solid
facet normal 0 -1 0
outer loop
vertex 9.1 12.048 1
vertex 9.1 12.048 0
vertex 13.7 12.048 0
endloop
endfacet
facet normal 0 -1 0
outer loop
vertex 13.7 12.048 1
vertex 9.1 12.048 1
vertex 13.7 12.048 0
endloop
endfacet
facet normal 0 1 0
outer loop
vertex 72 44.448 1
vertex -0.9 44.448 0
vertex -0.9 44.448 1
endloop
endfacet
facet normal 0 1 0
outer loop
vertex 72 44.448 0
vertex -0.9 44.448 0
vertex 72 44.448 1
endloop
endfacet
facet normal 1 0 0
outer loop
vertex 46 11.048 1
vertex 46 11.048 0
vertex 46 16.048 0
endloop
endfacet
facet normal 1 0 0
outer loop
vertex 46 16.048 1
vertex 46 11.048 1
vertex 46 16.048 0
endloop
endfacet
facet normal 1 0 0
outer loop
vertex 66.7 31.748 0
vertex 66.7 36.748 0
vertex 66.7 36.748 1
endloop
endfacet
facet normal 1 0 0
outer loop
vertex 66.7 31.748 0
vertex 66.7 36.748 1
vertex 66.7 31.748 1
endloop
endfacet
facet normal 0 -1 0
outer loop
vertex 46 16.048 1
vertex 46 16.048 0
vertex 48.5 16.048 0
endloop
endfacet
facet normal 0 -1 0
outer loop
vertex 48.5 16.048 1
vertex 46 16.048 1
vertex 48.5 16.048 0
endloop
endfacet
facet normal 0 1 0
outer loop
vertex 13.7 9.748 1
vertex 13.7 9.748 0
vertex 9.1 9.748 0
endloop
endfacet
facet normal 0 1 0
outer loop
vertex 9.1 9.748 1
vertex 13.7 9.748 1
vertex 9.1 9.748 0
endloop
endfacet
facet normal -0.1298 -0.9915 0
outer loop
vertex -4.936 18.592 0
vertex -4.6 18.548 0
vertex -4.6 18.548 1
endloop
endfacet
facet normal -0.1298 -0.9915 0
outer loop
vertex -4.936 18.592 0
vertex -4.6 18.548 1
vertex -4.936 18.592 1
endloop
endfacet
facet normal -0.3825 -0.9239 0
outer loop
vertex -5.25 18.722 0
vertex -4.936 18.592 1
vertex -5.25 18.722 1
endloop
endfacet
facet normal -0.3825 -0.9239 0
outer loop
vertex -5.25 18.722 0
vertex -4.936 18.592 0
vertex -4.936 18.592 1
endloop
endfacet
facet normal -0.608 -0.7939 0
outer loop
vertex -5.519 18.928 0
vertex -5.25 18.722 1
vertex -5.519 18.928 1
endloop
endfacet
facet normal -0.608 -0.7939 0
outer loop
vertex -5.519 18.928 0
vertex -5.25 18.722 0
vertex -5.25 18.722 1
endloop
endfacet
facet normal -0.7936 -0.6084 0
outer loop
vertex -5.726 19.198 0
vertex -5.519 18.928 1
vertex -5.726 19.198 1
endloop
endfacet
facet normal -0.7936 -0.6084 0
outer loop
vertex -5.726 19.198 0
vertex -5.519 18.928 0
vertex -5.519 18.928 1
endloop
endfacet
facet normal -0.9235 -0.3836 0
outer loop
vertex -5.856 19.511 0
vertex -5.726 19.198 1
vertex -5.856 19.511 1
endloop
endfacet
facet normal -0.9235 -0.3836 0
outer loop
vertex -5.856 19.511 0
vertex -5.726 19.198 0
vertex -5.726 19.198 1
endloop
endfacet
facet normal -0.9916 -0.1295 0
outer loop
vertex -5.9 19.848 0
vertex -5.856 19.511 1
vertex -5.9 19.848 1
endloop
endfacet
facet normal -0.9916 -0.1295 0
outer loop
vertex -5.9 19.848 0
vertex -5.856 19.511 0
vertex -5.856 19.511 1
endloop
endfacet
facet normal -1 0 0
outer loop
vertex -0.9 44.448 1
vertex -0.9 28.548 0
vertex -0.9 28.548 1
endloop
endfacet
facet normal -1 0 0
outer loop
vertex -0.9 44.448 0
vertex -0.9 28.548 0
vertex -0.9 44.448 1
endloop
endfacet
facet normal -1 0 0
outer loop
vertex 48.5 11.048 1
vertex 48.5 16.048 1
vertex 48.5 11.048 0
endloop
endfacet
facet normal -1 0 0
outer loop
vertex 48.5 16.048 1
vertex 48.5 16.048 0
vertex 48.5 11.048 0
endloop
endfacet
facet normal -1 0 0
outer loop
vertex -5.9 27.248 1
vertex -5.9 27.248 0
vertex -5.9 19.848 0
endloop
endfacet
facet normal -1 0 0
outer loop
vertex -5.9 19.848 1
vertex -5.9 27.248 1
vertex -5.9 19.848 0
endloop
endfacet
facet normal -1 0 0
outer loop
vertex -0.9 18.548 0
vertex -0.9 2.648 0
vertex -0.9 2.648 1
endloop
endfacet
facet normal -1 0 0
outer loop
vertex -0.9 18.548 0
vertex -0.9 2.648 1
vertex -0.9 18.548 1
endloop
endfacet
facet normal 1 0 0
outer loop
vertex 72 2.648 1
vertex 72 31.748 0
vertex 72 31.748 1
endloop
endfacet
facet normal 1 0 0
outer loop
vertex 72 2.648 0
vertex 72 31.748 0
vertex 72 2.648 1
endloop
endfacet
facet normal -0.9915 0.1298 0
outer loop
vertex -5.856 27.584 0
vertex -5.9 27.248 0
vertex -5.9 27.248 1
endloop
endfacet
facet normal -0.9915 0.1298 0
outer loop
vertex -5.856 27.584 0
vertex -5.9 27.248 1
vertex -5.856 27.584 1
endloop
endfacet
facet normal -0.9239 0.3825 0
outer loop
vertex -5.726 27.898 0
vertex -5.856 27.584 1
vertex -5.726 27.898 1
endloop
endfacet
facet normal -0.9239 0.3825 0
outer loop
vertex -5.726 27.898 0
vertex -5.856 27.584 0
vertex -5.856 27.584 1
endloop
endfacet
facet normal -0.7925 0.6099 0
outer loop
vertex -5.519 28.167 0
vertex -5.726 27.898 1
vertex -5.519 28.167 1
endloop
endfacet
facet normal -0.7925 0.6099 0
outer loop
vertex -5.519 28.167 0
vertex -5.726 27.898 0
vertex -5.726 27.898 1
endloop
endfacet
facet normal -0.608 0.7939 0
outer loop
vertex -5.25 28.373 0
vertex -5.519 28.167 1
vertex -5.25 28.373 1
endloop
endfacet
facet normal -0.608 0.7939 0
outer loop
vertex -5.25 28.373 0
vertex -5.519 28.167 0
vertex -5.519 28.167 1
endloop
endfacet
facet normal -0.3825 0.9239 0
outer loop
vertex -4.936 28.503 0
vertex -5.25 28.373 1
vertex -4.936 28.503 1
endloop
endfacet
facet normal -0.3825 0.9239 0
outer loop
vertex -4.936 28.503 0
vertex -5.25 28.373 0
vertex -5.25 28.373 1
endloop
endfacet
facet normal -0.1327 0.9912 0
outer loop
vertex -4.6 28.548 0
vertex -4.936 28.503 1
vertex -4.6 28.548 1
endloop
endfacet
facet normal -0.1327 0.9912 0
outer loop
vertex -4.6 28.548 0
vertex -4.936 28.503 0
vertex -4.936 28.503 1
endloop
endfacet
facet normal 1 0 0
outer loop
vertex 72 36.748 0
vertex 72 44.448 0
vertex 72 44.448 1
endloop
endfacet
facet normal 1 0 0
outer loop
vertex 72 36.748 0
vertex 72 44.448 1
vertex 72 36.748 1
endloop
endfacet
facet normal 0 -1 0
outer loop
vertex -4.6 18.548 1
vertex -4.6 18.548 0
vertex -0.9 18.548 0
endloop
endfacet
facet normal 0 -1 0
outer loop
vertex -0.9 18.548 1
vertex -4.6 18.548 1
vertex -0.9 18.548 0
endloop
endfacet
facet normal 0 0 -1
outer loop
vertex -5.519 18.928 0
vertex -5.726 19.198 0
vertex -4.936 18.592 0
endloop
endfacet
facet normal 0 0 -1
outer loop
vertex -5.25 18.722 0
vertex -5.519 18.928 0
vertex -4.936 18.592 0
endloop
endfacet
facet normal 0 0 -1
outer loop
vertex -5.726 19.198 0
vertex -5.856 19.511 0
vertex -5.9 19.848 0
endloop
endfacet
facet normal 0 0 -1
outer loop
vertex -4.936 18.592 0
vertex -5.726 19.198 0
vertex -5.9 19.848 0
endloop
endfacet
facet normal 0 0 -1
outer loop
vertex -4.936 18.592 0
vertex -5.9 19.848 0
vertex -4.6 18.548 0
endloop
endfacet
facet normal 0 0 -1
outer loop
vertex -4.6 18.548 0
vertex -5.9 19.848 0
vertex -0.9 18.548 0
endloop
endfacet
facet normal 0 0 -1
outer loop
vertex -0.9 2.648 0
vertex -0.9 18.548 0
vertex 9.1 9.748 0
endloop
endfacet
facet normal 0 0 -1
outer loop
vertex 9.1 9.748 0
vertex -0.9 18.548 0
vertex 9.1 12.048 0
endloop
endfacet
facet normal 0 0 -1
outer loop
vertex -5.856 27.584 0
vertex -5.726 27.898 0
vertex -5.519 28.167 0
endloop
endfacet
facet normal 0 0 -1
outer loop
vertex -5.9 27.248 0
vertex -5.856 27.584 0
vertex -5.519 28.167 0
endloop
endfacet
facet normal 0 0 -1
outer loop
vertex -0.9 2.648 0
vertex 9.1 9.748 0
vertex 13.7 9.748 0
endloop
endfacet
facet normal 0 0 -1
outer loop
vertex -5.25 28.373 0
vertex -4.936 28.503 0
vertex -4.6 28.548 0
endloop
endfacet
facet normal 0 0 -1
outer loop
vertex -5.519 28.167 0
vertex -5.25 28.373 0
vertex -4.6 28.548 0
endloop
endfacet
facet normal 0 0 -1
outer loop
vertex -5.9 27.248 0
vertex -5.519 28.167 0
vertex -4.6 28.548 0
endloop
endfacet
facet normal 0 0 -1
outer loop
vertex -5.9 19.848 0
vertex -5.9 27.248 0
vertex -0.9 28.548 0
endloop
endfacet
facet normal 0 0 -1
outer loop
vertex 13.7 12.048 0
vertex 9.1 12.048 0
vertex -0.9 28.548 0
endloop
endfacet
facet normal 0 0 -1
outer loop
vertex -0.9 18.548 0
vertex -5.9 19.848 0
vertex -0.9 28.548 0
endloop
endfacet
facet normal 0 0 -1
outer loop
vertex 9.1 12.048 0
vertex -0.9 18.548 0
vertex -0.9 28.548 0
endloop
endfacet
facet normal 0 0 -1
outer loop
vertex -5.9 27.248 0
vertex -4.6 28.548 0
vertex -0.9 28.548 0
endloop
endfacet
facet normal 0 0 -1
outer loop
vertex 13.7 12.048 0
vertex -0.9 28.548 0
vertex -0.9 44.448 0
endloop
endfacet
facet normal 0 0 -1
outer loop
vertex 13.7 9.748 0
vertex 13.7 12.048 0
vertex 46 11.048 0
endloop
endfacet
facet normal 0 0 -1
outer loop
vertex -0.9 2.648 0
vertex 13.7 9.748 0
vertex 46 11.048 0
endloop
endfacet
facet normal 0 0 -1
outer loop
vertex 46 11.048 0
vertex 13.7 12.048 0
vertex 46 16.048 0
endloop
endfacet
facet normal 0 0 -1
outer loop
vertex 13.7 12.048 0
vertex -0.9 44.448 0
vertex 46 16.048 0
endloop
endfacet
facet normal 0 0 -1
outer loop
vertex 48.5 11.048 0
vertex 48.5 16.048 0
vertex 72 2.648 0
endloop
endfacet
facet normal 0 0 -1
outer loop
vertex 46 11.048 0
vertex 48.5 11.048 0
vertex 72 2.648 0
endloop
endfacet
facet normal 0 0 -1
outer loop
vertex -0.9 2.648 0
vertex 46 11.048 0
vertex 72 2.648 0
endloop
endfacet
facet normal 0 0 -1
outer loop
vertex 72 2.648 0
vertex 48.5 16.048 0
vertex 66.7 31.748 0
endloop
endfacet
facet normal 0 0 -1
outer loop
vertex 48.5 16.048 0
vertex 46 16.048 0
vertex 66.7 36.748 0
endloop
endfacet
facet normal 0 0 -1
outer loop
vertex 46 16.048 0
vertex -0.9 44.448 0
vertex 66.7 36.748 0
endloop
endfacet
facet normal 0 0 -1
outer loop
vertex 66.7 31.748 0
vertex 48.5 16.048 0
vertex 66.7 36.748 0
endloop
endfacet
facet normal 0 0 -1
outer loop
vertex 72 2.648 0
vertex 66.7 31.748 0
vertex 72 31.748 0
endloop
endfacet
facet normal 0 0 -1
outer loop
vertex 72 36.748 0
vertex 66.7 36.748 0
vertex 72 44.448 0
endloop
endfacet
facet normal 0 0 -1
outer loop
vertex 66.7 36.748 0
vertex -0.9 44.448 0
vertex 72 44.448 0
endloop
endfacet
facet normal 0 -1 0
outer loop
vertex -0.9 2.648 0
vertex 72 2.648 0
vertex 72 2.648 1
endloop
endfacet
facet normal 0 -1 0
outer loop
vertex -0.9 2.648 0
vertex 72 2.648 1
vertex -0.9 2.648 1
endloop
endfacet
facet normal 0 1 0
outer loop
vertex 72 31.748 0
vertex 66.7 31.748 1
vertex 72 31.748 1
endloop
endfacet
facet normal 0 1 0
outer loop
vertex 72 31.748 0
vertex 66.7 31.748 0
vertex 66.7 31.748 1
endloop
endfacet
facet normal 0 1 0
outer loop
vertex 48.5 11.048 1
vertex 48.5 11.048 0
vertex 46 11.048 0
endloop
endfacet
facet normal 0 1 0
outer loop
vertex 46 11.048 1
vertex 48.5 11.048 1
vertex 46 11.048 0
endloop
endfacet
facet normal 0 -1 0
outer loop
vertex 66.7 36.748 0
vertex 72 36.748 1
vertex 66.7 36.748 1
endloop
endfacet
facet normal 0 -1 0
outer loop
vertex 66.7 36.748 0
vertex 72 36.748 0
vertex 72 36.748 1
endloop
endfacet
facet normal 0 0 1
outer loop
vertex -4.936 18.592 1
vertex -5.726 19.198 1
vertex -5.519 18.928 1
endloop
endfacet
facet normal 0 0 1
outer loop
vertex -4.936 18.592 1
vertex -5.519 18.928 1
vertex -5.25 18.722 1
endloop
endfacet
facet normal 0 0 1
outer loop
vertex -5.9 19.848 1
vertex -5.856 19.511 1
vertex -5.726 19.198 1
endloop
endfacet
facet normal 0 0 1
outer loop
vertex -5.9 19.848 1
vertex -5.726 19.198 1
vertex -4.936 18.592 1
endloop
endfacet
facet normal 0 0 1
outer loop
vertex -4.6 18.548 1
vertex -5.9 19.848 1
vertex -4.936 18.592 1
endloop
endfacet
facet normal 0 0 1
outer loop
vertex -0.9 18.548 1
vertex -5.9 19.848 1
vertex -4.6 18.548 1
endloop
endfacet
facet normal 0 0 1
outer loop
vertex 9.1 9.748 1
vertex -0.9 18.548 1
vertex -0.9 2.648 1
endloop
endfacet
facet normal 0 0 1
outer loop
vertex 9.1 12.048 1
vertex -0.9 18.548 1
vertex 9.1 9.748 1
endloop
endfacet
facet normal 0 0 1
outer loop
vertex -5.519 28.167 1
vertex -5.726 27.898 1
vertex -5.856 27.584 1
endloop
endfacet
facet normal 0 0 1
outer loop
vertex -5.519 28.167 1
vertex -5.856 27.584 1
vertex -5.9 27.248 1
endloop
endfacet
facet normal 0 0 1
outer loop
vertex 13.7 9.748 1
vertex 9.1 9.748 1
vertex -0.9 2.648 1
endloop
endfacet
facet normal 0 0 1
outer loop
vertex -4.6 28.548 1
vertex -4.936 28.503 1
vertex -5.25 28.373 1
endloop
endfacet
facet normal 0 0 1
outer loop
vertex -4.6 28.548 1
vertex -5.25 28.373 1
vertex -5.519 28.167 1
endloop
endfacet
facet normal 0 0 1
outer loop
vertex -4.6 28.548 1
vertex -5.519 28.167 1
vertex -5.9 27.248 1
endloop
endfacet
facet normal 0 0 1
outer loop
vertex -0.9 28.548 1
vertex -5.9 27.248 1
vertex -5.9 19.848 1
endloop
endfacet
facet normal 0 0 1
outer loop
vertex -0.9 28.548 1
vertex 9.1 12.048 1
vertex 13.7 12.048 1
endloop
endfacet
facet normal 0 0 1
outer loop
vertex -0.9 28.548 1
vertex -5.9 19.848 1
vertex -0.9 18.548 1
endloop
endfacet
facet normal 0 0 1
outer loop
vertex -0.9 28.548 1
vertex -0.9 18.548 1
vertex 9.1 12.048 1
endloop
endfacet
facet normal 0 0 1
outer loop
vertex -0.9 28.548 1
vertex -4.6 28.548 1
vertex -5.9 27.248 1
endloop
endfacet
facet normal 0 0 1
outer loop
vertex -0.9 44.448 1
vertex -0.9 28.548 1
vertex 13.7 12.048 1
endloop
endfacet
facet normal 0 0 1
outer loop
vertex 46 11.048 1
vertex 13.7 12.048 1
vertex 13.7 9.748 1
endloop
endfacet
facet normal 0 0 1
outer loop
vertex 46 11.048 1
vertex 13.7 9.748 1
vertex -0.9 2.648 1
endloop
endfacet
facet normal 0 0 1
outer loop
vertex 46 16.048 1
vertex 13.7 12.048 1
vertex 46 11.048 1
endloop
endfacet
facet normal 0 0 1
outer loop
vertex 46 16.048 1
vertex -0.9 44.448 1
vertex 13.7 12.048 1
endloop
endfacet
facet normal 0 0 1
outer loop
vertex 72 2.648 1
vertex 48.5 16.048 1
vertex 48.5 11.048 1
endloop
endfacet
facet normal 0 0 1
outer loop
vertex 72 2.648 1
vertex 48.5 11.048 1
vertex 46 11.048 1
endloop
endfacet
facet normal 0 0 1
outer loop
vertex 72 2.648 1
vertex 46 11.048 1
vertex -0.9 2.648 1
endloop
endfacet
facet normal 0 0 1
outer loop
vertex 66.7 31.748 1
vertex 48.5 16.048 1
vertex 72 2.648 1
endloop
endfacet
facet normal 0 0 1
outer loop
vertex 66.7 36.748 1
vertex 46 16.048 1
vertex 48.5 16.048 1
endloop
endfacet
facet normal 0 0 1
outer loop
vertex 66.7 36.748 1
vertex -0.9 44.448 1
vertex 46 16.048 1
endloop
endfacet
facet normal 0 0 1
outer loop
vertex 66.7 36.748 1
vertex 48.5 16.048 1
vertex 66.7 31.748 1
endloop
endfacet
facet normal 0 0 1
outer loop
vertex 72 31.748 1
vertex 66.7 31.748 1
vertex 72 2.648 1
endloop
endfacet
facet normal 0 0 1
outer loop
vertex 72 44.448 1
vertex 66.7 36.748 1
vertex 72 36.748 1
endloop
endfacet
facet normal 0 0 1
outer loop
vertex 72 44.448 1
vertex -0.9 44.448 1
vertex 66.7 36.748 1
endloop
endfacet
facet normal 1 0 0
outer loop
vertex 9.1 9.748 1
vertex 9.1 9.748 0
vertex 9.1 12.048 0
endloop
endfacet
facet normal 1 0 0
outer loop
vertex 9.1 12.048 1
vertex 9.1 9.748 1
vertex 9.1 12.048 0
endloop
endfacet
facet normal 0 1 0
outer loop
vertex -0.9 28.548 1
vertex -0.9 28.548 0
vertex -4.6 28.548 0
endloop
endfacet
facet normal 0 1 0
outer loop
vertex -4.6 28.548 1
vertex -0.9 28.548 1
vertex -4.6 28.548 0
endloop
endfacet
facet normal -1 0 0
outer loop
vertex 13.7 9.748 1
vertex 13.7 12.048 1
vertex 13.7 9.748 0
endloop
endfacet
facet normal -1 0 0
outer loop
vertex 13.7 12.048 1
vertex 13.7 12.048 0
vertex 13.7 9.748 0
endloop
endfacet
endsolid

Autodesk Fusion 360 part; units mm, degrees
sketch "Sketch1" plane through (0, 0, 0) normal (0, 0, 1) x (1, 0, 0)
  line L0 (-0.9, 44.4476) -> (72, 44.4476)
  line L1 (72, 44.4476) -> (72, 2.6476)
  line L2 (72, 2.6476) -> (-0.9, 2.6476)
  line L3 (-0.9, 2.6476) -> (-0.9, 44.4476)
  line L4 (-0.9, 23.5476) -> (72, 23.5476) construction
  line L5 (-0.9, 28.5476) -> (-4.6, 28.5476)
  line L6 (-5.9, 27.2476) -> (-5.9, 19.8476)
  line L7 (-4.6, 18.5476) -> (-0.9, 18.5476)
  line L8 (-0.9, 18.5476) -> (-0.9, 28.5476)
  arc A0 (-4.6, 28.5476) -> (-5.9, 27.2476) centre (-4.6, 27.2476) ccw
  arc A1 (-5.9, 19.8476) -> (-4.6, 18.5476) centre (-4.6, 19.8476) ccw
  line L9 (72, 36.7476) -> (66.7, 36.7476)
  line L10 (66.7, 36.7476) -> (66.7, 31.7476)
  line L11 (66.7, 31.7476) -> (72, 31.7476)
  line L12 (72, 31.7476) -> (72, 36.7476)
  line L13 (46, 16.0476) -> (48.5, 16.0476)
  line L14 (48.5, 16.0476) -> (48.5, 11.0476)
  line L15 (48.5, 11.0476) -> (46, 11.0476)
  line L16 (46, 11.0476) -> (46, 16.0476)
  line L17 (9.1, 12.0476) -> (13.7, 12.0476)
  line L18 (13.7, 12.0476) -> (13.7, 9.7476)
  line L19 (13.7, 9.7476) -> (9.1, 9.7476)
  line L20 (9.1, 9.7476) -> (9.1, 12.0476)
  point P0 (-5.9, 28.5476)
  point P1 (-5.9, 18.5476)
  dimension "d1" = 72.9
  dimension "d2" = 41.8
  dimension "d7" = 10
  dimension "d8" = 5
  dimension "d9" = 1.3
  dimension "d10" = 5.3
  dimension "d11" = 5
  dimension "d12" = 7.7
  dimension "d13" = 2.5
  dimension "d14" = 5
  dimension "d15" = 8.4
  dimension "d16" = 23.5
  dimension "d17" = 2.3
  dimension "d18" = 7.1
  dimension "d19" = 10
  dimension "d20" = 14.6
extrude "Extrude1" add sketch "Sketch1" along normal blind 1 contours L0 L1 L2 L3 L8 L9 L10 L11 | L3 L5 L6 L7 L8 A0 A1
